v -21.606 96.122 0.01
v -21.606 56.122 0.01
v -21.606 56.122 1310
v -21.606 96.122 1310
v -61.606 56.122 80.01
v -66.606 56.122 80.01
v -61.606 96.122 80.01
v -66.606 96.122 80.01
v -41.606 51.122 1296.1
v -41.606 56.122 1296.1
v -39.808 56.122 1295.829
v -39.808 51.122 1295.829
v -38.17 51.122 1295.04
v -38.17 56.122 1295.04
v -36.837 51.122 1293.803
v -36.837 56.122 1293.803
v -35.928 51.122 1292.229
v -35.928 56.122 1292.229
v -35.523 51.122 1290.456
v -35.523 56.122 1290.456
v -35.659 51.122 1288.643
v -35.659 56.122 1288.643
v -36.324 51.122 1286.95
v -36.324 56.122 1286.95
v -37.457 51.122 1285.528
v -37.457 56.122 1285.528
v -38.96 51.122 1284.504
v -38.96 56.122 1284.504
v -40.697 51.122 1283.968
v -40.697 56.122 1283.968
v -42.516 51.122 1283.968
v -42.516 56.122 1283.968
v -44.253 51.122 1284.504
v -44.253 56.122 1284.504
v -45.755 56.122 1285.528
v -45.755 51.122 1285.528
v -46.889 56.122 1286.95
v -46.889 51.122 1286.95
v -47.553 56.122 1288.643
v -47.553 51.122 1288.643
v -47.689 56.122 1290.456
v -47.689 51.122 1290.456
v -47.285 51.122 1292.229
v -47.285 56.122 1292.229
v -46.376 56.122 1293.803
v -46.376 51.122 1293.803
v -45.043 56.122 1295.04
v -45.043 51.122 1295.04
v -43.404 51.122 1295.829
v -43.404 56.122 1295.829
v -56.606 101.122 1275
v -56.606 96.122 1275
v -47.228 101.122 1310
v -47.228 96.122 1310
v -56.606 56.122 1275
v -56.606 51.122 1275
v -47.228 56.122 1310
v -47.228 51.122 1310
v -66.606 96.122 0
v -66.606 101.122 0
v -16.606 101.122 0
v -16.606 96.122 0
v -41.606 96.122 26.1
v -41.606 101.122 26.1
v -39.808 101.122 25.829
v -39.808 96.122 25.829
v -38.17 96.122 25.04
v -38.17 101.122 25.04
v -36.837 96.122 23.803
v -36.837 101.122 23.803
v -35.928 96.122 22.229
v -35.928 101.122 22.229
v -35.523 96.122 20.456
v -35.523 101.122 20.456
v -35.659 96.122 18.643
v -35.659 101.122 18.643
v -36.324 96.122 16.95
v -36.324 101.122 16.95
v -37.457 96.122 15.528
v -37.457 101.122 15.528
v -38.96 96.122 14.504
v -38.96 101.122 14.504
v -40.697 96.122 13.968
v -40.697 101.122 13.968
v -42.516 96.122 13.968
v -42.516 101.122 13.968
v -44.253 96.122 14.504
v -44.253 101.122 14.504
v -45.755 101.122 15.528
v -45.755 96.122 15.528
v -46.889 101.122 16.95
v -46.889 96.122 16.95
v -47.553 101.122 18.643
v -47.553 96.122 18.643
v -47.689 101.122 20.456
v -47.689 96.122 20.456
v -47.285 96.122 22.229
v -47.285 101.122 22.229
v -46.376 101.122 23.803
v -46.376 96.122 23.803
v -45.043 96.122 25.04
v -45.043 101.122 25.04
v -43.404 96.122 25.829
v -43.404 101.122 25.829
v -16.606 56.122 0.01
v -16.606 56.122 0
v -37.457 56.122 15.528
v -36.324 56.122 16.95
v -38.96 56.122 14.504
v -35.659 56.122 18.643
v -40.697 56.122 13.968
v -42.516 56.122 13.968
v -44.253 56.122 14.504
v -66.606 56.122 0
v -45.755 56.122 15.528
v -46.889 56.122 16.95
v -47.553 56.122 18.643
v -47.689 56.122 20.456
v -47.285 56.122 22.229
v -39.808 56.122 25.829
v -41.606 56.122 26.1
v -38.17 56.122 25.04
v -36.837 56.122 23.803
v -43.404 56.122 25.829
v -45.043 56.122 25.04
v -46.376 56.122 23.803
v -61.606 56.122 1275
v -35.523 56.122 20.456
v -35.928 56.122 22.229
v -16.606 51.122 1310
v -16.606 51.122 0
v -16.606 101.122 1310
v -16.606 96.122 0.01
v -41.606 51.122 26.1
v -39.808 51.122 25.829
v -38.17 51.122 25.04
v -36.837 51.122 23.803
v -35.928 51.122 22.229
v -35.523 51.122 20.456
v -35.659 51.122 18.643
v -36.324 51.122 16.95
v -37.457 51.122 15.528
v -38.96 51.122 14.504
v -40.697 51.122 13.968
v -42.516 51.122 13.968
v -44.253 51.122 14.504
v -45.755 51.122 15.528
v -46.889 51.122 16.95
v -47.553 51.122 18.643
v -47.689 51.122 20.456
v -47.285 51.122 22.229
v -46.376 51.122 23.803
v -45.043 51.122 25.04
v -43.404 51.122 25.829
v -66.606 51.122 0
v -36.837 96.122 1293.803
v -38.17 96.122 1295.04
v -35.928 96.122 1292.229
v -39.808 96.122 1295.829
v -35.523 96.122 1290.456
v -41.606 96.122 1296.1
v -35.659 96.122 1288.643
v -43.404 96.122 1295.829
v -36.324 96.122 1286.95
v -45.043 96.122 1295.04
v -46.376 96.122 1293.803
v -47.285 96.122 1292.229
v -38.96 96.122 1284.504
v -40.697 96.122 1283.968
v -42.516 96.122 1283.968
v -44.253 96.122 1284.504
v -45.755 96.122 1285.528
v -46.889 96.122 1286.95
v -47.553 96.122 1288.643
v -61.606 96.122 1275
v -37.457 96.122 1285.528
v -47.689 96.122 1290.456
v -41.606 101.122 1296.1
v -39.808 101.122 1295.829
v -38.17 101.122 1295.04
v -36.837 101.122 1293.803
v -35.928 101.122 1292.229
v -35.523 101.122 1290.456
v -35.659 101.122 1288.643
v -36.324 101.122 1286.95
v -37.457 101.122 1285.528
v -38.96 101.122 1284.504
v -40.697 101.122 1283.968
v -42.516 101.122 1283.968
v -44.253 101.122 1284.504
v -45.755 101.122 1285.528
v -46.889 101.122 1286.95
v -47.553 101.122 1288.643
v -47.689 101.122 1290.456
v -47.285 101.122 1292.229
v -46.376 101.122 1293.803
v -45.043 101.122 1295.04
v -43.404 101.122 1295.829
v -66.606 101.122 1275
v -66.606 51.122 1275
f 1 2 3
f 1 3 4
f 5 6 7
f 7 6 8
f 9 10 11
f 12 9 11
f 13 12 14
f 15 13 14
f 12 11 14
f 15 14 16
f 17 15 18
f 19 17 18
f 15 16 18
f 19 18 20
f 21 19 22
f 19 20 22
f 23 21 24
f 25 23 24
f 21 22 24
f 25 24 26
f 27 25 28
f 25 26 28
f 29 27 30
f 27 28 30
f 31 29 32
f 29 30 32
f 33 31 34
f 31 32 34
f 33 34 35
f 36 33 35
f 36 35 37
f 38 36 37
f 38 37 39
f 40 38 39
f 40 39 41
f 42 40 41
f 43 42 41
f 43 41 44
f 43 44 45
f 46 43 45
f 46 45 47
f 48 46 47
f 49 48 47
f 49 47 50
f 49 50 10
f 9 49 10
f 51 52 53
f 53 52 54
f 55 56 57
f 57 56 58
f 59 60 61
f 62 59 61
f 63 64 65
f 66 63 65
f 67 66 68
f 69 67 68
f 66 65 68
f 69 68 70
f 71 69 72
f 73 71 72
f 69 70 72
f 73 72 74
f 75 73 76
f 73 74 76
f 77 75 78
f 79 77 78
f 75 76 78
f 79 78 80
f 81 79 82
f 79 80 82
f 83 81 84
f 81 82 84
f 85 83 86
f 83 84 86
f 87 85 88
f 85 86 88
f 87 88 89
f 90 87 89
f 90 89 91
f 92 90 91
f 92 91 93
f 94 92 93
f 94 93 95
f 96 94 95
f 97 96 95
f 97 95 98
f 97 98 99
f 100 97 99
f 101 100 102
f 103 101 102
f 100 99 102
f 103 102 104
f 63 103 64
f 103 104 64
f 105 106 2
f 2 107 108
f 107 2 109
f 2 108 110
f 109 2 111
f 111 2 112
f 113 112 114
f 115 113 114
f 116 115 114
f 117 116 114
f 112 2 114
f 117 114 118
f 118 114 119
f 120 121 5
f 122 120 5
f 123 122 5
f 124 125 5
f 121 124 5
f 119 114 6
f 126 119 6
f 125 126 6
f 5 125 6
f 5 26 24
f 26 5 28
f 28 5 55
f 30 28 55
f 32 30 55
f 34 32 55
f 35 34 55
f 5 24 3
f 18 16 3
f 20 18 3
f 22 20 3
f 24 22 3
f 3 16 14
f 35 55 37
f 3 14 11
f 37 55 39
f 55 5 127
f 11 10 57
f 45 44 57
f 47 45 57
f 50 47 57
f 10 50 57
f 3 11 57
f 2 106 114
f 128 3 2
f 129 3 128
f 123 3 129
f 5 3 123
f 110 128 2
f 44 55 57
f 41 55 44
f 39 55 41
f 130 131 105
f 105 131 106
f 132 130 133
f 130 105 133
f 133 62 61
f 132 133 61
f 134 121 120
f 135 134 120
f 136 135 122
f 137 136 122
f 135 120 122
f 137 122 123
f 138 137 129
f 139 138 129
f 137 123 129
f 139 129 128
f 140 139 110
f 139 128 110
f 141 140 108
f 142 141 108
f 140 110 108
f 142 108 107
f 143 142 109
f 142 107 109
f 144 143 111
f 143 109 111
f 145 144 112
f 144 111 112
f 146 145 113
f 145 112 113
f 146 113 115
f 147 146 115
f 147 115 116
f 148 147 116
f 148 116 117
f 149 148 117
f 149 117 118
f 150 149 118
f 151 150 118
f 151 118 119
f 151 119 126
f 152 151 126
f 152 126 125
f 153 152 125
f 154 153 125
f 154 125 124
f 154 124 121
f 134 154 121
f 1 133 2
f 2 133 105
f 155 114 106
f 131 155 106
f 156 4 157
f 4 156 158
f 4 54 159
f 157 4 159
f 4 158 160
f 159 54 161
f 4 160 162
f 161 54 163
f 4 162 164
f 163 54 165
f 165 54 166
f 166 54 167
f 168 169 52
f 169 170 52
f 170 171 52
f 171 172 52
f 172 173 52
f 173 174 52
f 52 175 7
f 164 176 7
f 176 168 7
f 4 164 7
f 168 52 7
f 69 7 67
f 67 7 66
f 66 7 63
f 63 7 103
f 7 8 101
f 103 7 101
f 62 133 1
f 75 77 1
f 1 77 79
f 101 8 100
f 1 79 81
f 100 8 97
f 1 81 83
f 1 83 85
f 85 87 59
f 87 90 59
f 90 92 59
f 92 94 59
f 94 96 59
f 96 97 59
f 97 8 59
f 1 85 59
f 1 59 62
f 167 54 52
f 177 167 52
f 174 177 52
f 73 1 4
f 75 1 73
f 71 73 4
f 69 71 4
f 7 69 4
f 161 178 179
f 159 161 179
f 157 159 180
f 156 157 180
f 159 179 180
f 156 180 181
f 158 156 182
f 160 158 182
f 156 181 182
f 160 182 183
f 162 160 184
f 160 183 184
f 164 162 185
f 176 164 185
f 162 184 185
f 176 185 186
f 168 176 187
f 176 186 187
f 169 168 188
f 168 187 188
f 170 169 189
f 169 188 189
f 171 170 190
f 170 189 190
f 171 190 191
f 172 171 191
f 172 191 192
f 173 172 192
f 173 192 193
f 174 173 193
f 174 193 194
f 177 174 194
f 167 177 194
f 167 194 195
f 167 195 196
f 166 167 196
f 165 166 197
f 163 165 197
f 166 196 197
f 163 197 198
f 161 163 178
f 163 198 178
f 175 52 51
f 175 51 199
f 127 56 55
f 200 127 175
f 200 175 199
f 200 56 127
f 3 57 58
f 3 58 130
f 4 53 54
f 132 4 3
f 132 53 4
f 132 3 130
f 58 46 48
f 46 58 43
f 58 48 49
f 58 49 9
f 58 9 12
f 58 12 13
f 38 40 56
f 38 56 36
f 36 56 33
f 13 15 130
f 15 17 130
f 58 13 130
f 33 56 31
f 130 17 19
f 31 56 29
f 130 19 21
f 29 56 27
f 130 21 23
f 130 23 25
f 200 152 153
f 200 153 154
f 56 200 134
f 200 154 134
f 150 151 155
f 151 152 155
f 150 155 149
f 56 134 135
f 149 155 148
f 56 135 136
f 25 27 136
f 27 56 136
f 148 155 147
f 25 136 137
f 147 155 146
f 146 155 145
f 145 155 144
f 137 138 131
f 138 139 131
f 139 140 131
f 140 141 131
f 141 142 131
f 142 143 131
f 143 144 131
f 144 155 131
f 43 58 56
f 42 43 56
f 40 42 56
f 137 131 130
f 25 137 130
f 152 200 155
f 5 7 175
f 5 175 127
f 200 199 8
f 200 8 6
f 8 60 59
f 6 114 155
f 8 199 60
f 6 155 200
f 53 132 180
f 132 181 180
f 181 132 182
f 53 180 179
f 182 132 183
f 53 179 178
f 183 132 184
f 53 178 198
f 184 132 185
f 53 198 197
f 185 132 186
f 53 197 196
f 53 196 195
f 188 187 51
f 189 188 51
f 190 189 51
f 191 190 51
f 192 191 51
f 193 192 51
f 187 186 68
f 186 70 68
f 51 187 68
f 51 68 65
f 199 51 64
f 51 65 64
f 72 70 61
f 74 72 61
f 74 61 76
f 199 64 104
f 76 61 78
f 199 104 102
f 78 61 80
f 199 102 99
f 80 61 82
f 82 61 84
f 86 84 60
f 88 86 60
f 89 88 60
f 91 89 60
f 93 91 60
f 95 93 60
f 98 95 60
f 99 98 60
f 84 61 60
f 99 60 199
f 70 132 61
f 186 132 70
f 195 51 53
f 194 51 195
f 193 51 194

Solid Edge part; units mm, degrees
sketch "Sketch1" plane through (0, 0, 0) normal (0, 0, 1) x (1, 0, 0)
  line L0 (-61.6064, 56.1225) -> (-21.6064, 56.1225)
  line L1 (-21.6064, 56.1225) -> (-21.6064, 96.1225)
  line L2 (-21.6064, 96.1225) -> (-61.6064, 96.1225)
  line L3 (-61.6064, 96.1225) -> (-61.6064, 56.1225)
  line L4 (-66.6064, 51.1225) -> (-16.6064, 51.1225)
  line L5 (-16.6064, 51.1225) -> (-16.6064, 101.1225)
  line L6 (-16.6064, 101.1225) -> (-66.6064, 101.1225)
  line L7 (-66.6064, 101.1225) -> (-66.6064, 51.1225)
  dimension "D1" = 50
  dimension "D2" = 50
  dimension "D3" = 5
  dimension "D4" = 5
extrude "Protrusion1" add sketch "Sketch1" along normal blind 1310
sketch "Sketch2" plane through (-66.6064, 101.1225, 788.35) normal (0, 1, 0) x (0, 0, 1)
  circle A0 centre (501.65, 25) radius 6.1
  circle A1 centre (-768.35, 25) radius 6.1
  dimension "D1" = 12.2
  dimension "D2" = 12.2
  dimension "D3" = 20
  dimension "D4" = 20
extrude "Cutout1" cut sketch "Sketch2" against normal through all
sketch "Sketch3" plane through (-66.6064, 81.1225, 788.35) normal (-1, 0, 0) x (0, 0, 1)
  line L0 (-788.35, 15) -> (-788.35, -25)
  line L1 (-788.35, -25) -> (-788.34, -25)
  line L2 (-788.34, -25) -> (-788.34, 15)
  line L3 (-788.34, 15) -> (-788.35, 15)
  dimension "D1" = 0.01
  dimension "D2" = 40
extrude "Cutout2" cut sketch "Sketch3" against normal blind 5
sketch "Sketch4" plane through (-16.6064, 81.1225, 788.35) normal (1, 0, 0) x (0, 0, 1)
  line L0 (-788.35, -15) -> (-788.34, -15)
  line L1 (-788.34, -15) -> (-788.34, 25)
  line L2 (-788.34, 25) -> (-788.35, 25)
  line L3 (-788.35, 25) -> (-788.35, -15)
  dimension "D1" = 0.01
  dimension "D2" = 40
extrude "ExtrudedCutout_3" cut sketch "Sketch4" against normal blind 5
sketch "Sketch5" plane through (-66.6064, 51.1225, 704.15) normal (0, -1, 0) x (0, 0, -1)
  line L0 (-605.85, 0) -> (-605.85, 19.3782)
  line L1 (-570.85, 10) -> (-605.85, 19.3782)
  line L2 (-570.85, 10) -> (-570.85, 0)
  line L3 (-570.85, 0) -> (-605.85, 0)
  dimension "D1" = 10
  dimension "D2" = 35
extrude "Cutout3" cut sketch "Sketch5" against normal through all
sketch "Sketch6" plane through (-66.6064, 76.1225, 637.5) normal (-1, 0, 0) x (0, 0, 1)
  line L0 (-637.49, -20) -> (-557.49, -20)
  line L1 (-557.49, -20) -> (-557.49, 20)
  line L2 (-557.49, 20) -> (-637.49, 20)
  line L3 (-637.49, 20) -> (-637.49, -20)
  dimension "D1" = 40
  dimension "D2" = 80
extrude "Cutout4" cut sketch "Sketch6" against normal up to next
properties material "Aluminum, 6061-T6"
